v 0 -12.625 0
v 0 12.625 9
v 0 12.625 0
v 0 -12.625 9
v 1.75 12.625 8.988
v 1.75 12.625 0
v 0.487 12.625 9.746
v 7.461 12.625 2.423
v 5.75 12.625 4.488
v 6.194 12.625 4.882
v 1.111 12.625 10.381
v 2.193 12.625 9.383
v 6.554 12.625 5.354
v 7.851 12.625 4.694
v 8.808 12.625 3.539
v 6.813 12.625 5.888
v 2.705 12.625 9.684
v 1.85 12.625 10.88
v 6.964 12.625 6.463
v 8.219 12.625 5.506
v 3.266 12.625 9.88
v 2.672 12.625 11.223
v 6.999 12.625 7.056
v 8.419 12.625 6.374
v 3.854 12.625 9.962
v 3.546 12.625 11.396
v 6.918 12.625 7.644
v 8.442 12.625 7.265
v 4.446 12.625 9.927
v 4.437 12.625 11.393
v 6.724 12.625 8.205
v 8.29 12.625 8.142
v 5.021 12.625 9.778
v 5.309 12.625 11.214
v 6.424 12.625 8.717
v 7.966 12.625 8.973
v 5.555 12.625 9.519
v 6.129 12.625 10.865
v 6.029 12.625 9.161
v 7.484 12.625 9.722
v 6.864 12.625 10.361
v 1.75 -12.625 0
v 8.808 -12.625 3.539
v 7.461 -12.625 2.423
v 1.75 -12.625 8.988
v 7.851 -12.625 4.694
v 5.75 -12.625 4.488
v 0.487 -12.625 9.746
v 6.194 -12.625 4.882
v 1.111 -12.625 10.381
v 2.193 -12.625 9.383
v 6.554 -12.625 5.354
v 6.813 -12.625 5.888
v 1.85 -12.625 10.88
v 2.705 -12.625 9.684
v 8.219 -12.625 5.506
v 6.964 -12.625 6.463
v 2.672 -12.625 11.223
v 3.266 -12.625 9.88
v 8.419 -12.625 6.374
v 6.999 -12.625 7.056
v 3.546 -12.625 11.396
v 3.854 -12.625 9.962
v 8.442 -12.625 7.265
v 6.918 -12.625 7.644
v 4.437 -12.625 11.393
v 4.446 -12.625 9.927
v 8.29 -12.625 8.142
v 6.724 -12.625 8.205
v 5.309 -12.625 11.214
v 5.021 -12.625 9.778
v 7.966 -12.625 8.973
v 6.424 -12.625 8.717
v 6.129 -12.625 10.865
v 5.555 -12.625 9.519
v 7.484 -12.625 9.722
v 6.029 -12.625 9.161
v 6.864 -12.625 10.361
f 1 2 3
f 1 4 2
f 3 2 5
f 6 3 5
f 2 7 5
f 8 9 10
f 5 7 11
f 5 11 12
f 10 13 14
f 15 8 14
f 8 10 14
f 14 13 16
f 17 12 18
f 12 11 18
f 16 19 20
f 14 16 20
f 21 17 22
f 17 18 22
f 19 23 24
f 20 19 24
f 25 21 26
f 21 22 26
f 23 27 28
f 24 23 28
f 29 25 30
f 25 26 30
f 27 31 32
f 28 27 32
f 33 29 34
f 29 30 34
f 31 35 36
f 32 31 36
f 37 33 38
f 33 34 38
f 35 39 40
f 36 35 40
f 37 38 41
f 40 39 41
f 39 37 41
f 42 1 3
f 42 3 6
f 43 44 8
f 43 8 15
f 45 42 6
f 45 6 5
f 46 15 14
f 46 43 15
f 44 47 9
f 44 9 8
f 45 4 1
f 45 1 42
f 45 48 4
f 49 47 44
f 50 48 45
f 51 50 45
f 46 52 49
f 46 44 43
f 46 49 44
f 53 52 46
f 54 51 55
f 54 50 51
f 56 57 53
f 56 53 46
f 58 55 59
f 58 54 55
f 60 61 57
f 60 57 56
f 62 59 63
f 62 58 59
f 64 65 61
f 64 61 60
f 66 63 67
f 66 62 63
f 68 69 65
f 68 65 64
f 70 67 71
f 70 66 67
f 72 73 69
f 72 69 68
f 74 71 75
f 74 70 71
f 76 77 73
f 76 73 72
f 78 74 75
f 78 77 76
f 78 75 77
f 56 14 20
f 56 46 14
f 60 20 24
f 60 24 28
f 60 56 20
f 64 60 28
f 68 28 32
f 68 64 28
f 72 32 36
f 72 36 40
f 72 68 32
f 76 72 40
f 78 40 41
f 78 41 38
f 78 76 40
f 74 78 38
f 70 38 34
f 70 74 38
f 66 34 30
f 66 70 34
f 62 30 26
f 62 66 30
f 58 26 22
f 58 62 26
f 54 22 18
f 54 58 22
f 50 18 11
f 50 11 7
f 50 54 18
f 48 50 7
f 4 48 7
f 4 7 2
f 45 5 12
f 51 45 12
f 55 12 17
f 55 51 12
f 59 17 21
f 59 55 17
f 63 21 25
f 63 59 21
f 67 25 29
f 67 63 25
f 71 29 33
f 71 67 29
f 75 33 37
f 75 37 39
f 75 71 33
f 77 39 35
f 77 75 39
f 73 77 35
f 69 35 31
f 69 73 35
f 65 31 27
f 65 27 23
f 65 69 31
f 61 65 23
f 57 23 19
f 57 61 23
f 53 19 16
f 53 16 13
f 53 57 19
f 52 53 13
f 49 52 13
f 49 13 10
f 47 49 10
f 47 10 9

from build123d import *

# Parameters (mm, degrees)
F1_DEPTH = 12.625


with BuildPart() as f1:
    # F0 (on Front) → F1 (new body, symmetric)
    with BuildSketch(Plane.XZ):
        with BuildLine():
            Line((0, 9), (0, 0))
            Line((0, 0), (1.75, 0))
            Line((1.75, 0), (1.75, 4.487874))
            Line((1.75, 4.487874), (1.75, 8.987874))
            ThreePointArc((1.75, 8.987874), (6.237186, 8.948706), (5.75, 4.487874))
            Line((5.75, 4.487874), (7.460699, 2.422835))
            Line((7.460699, 2.422835), (8.808343, 3.539237))
            Line((8.808343, 3.539237), (7.851427, 4.694361))
            ThreePointArc((7.851427, 4.694361), (6.12928, 10.865432), (0, 9))
        make_face()
    extrude(amount=F1_DEPTH, both=True)


solid = f1.part
